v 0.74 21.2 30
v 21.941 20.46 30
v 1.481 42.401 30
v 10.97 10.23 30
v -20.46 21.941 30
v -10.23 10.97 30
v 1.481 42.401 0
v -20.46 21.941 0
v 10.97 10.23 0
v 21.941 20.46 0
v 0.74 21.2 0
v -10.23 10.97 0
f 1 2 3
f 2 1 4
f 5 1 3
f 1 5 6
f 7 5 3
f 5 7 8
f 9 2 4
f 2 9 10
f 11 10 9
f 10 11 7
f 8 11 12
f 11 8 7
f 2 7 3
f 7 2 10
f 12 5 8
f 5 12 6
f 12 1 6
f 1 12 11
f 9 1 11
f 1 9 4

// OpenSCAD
rotate([0,0,-2])
rotate([0,-90,0]){
    difference(){
        rotate([-45,0,0]) {
            cube([30, 30, 30]);
        }
        scale([1,0.5,0.5]) {
            rotate([-45,0,0]) {
                cube([30, 30, 30]);
            }
        }
    }
}
